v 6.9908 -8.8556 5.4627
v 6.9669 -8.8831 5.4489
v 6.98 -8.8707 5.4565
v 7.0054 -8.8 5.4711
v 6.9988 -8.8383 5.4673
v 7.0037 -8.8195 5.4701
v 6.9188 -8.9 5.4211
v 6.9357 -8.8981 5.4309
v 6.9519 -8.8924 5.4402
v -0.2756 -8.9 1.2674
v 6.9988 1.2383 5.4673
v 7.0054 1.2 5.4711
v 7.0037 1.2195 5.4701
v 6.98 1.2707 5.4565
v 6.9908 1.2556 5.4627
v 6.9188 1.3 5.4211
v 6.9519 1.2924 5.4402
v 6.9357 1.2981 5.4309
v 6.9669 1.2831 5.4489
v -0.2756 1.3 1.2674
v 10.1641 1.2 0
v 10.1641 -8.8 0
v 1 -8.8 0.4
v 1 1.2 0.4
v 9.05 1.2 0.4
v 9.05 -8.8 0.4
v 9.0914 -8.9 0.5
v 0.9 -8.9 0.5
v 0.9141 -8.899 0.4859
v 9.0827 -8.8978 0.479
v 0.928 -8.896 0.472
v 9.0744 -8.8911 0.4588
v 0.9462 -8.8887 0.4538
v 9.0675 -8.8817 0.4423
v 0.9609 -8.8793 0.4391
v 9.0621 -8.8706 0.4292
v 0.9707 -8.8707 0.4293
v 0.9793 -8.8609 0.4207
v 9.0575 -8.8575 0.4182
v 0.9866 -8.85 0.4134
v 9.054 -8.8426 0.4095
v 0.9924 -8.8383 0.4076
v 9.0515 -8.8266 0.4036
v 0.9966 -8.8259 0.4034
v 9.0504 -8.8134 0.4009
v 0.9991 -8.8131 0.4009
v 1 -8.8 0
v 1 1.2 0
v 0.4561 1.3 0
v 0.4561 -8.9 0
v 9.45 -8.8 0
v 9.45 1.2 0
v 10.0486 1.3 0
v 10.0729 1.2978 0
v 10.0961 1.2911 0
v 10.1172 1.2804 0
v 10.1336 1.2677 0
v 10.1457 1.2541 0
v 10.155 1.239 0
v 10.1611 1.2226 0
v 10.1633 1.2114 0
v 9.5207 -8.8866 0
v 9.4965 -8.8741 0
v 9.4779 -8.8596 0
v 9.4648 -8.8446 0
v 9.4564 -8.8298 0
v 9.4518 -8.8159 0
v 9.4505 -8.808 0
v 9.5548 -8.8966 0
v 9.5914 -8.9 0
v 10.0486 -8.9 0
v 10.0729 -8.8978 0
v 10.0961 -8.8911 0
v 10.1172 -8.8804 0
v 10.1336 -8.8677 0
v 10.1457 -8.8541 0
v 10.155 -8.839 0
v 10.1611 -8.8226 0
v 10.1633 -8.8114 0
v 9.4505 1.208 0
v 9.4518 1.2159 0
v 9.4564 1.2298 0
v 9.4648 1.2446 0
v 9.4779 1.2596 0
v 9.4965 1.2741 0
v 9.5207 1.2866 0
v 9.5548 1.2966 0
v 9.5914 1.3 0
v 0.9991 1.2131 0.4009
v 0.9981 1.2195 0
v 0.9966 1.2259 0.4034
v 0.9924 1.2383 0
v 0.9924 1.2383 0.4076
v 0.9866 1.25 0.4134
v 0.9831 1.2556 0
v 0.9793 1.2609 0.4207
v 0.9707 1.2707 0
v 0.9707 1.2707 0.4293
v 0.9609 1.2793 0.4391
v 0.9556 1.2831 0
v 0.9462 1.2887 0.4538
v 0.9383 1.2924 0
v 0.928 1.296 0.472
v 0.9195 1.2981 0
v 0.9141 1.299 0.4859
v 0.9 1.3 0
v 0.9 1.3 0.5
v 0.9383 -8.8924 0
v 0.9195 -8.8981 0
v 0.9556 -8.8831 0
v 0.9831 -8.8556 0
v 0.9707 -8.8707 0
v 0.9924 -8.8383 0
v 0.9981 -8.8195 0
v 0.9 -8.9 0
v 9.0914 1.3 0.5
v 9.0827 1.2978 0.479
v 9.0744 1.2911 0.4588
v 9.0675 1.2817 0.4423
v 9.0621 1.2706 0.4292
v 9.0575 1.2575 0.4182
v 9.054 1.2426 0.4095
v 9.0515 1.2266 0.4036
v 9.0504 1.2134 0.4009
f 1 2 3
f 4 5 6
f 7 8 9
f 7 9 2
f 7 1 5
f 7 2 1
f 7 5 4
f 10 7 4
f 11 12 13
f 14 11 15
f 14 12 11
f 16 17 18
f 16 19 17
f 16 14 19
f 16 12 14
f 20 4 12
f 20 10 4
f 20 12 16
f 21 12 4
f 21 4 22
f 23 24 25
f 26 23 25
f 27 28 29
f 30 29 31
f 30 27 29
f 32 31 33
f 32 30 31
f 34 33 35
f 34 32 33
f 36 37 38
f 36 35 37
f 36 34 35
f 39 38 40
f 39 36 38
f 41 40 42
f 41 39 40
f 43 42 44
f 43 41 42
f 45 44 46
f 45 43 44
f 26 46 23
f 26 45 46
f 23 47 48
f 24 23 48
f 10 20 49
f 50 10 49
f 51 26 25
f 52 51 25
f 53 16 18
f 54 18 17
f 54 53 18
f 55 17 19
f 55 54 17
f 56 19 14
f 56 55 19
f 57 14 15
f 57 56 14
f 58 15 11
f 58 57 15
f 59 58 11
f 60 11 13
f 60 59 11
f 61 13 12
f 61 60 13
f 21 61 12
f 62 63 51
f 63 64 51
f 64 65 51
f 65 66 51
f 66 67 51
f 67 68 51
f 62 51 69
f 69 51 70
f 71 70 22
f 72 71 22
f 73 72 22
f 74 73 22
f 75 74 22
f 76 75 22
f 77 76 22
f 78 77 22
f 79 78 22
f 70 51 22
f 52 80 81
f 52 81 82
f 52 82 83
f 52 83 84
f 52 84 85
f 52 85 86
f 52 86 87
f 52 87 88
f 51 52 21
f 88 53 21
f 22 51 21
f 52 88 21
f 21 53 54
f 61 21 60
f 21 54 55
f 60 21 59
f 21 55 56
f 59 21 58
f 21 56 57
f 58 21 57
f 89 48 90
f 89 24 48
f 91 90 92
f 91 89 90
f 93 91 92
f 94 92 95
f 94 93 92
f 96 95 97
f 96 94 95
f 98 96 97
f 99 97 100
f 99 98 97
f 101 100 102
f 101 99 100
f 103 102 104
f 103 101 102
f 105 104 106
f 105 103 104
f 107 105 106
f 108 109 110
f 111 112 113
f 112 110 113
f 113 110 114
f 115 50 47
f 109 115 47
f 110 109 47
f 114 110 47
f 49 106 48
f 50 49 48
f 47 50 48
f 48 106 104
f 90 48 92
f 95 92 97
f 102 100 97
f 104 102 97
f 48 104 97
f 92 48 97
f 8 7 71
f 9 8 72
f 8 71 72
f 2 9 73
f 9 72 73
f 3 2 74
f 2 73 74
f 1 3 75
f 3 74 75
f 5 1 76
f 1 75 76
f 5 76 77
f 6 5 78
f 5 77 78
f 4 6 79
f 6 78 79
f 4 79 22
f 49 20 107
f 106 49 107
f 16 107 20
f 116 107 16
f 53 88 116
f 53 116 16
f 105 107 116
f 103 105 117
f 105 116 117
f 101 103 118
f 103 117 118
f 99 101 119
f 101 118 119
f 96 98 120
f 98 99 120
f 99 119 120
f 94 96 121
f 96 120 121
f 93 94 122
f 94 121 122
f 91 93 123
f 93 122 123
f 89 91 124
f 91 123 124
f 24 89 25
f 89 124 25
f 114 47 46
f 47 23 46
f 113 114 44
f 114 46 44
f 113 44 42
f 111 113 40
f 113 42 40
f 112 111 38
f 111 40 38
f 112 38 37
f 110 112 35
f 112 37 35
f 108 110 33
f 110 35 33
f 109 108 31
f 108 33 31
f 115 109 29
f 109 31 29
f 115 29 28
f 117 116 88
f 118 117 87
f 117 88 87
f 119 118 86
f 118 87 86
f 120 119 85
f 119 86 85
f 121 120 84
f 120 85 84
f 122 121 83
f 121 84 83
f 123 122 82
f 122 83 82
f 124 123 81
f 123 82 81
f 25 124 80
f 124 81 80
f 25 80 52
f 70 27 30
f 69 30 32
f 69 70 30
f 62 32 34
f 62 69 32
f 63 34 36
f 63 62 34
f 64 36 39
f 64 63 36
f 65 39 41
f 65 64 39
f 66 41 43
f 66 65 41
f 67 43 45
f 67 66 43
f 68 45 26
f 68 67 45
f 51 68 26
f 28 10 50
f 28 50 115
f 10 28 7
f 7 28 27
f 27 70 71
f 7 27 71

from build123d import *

# Parameters (mm, degrees)
BOX019_W           = 8.5
BOX019_H           = 14
BOX019_DEPTH       = 0.5
CHAMFER_SIZE       = 0.45
BOX014_W           = 8.7
BOX014_H           = 10.2
BOX014_DEPTH       = 6.15
BOX014_PITCH_ANGLE = 60
BOX013_W           = 8.7
BOX013_H           = 12.2
BOX013_DEPTH       = 11.15
BOX013_PITCH_ANGLE = 60
BOX012_W           = 8.7
BOX012_H           = 10.2
BOX012_DEPTH       = 6.15
BOX012_PITCH_ANGLE = 60
BOX011_W           = 11
BOX011_H           = 10.2
BOX011_DEPTH       = 6.15
FILLET002_R        = 0.1
FILLET003_R        = 0.1


with BuildPart() as chamfer_body:
    # Box019 → Box019 (new body)
    with BuildSketch(Plane(origin=(1, -11, -0.1), x_dir=(1, 0, 0), z_dir=(0, 0, 1))):
        with Locations((4.25, 7)):
            Rectangle(BOX019_W, BOX019_H)
    extrude(amount=BOX019_DEPTH)

    # Chamfer
    chamfer_edges = [chamfer_body.edges().sort_by_distance(p)[0] for p in [
        (9.5, -4, 0.4),
    ]]
    chamfer(chamfer_edges, length=CHAMFER_SIZE)


with BuildPart() as kub014:
    # Box014 → Box014 (new body)
    with BuildSketch(Plane.XY):
        with Locations((4.35, 5.1)):
            Rectangle(BOX014_W, BOX014_H)
    extrude(amount=BOX014_DEPTH)


with BuildPart() as kub014_1:
    # Box014 pitch: moved
    add(kub014.part.rotate(Axis((0, 0, 0), (0, 1, 0)), BOX014_PITCH_ANGLE))


with BuildPart() as kub014_2:
    # Box014 placement: moved
    add(kub014_1.part.moved(Location((-7.8, -8.9, 2))))


with BuildPart() as kub013:
    # Box013 → Box013 (new body)
    with BuildSketch(Plane.XY):
        with Locations((4.35, 6.1)):
            Rectangle(BOX013_W, BOX013_H)
    extrude(amount=BOX013_DEPTH)


with BuildPart() as kub013_1:
    # Box013 pitch: moved
    add(kub013.part.rotate(Axis((0, 0, 0), (0, 1, 0)), BOX013_PITCH_ANGLE))


with BuildPart() as kub013_2:
    # Box013 placement: moved
    add(kub013_1.part.moved(Location((-5.72, -9.9, 8.17))))


with BuildPart() as kub012:
    # Box012 → Box012 (new body)
    with BuildSketch(Plane.XY):
        with Locations((4.35, 5.1)):
            Rectangle(BOX012_W, BOX012_H)
    extrude(amount=BOX012_DEPTH)


with BuildPart() as kub012_1:
    # Box012 pitch: moved
    add(kub012.part.rotate(Axis((0, 0, 0), (0, 1, 0)), BOX012_PITCH_ANGLE))


with BuildPart() as kub012_2:
    # Box012 placement: moved
    add(kub012_1.part.moved(Location((6.7, -8.9, 6))))


with BuildPart() as fillet003:
    # Box011 → Box011 (new body)
    with BuildSketch(Plane(origin=(-0.5, -8.9, 0), x_dir=(1, 0, 0), z_dir=(0, 0, 1))):
        with Locations((5.5, 5.1)):
            Rectangle(BOX011_W, BOX011_H)
    extrude(amount=BOX011_DEPTH)

    # Cut007: cut Kub012
    add(kub012_2.part, mode=Mode.SUBTRACT)

    # Cut008: cut Kub013
    add(kub013_2.part, mode=Mode.SUBTRACT)

    # Cut009: cut Kub014
    add(kub014_2.part, mode=Mode.SUBTRACT)

    # Cut010: cut Chamfer body
    add(chamfer_body.part, mode=Mode.SUBTRACT)

    # Fillet002
    fillet002_edges = [fillet003.edges().sort_by_distance(p)[0] for p in [
        (1, -8.9, 0.2),
        (5.025, -8.9, 0.4),
        (9.25, -8.9, 0.2),
    ]]
    fillet(fillet002_edges, radius=FILLET002_R)

    # Fillet003
    fillet003_edges = [fillet003.edges().sort_by_distance(p)[0] for p in [
        (8.584732, -8.9, 2.735548),
        (8.584732, 1.3, 2.735548),
        (1, 1.3, 0.2),
        (5.025, 1.3, 0.4),
        (9.25, 1.3, 0.2),
    ]]
    fillet(fillet003_edges, radius=FILLET003_R)


solid = fillet003.part
